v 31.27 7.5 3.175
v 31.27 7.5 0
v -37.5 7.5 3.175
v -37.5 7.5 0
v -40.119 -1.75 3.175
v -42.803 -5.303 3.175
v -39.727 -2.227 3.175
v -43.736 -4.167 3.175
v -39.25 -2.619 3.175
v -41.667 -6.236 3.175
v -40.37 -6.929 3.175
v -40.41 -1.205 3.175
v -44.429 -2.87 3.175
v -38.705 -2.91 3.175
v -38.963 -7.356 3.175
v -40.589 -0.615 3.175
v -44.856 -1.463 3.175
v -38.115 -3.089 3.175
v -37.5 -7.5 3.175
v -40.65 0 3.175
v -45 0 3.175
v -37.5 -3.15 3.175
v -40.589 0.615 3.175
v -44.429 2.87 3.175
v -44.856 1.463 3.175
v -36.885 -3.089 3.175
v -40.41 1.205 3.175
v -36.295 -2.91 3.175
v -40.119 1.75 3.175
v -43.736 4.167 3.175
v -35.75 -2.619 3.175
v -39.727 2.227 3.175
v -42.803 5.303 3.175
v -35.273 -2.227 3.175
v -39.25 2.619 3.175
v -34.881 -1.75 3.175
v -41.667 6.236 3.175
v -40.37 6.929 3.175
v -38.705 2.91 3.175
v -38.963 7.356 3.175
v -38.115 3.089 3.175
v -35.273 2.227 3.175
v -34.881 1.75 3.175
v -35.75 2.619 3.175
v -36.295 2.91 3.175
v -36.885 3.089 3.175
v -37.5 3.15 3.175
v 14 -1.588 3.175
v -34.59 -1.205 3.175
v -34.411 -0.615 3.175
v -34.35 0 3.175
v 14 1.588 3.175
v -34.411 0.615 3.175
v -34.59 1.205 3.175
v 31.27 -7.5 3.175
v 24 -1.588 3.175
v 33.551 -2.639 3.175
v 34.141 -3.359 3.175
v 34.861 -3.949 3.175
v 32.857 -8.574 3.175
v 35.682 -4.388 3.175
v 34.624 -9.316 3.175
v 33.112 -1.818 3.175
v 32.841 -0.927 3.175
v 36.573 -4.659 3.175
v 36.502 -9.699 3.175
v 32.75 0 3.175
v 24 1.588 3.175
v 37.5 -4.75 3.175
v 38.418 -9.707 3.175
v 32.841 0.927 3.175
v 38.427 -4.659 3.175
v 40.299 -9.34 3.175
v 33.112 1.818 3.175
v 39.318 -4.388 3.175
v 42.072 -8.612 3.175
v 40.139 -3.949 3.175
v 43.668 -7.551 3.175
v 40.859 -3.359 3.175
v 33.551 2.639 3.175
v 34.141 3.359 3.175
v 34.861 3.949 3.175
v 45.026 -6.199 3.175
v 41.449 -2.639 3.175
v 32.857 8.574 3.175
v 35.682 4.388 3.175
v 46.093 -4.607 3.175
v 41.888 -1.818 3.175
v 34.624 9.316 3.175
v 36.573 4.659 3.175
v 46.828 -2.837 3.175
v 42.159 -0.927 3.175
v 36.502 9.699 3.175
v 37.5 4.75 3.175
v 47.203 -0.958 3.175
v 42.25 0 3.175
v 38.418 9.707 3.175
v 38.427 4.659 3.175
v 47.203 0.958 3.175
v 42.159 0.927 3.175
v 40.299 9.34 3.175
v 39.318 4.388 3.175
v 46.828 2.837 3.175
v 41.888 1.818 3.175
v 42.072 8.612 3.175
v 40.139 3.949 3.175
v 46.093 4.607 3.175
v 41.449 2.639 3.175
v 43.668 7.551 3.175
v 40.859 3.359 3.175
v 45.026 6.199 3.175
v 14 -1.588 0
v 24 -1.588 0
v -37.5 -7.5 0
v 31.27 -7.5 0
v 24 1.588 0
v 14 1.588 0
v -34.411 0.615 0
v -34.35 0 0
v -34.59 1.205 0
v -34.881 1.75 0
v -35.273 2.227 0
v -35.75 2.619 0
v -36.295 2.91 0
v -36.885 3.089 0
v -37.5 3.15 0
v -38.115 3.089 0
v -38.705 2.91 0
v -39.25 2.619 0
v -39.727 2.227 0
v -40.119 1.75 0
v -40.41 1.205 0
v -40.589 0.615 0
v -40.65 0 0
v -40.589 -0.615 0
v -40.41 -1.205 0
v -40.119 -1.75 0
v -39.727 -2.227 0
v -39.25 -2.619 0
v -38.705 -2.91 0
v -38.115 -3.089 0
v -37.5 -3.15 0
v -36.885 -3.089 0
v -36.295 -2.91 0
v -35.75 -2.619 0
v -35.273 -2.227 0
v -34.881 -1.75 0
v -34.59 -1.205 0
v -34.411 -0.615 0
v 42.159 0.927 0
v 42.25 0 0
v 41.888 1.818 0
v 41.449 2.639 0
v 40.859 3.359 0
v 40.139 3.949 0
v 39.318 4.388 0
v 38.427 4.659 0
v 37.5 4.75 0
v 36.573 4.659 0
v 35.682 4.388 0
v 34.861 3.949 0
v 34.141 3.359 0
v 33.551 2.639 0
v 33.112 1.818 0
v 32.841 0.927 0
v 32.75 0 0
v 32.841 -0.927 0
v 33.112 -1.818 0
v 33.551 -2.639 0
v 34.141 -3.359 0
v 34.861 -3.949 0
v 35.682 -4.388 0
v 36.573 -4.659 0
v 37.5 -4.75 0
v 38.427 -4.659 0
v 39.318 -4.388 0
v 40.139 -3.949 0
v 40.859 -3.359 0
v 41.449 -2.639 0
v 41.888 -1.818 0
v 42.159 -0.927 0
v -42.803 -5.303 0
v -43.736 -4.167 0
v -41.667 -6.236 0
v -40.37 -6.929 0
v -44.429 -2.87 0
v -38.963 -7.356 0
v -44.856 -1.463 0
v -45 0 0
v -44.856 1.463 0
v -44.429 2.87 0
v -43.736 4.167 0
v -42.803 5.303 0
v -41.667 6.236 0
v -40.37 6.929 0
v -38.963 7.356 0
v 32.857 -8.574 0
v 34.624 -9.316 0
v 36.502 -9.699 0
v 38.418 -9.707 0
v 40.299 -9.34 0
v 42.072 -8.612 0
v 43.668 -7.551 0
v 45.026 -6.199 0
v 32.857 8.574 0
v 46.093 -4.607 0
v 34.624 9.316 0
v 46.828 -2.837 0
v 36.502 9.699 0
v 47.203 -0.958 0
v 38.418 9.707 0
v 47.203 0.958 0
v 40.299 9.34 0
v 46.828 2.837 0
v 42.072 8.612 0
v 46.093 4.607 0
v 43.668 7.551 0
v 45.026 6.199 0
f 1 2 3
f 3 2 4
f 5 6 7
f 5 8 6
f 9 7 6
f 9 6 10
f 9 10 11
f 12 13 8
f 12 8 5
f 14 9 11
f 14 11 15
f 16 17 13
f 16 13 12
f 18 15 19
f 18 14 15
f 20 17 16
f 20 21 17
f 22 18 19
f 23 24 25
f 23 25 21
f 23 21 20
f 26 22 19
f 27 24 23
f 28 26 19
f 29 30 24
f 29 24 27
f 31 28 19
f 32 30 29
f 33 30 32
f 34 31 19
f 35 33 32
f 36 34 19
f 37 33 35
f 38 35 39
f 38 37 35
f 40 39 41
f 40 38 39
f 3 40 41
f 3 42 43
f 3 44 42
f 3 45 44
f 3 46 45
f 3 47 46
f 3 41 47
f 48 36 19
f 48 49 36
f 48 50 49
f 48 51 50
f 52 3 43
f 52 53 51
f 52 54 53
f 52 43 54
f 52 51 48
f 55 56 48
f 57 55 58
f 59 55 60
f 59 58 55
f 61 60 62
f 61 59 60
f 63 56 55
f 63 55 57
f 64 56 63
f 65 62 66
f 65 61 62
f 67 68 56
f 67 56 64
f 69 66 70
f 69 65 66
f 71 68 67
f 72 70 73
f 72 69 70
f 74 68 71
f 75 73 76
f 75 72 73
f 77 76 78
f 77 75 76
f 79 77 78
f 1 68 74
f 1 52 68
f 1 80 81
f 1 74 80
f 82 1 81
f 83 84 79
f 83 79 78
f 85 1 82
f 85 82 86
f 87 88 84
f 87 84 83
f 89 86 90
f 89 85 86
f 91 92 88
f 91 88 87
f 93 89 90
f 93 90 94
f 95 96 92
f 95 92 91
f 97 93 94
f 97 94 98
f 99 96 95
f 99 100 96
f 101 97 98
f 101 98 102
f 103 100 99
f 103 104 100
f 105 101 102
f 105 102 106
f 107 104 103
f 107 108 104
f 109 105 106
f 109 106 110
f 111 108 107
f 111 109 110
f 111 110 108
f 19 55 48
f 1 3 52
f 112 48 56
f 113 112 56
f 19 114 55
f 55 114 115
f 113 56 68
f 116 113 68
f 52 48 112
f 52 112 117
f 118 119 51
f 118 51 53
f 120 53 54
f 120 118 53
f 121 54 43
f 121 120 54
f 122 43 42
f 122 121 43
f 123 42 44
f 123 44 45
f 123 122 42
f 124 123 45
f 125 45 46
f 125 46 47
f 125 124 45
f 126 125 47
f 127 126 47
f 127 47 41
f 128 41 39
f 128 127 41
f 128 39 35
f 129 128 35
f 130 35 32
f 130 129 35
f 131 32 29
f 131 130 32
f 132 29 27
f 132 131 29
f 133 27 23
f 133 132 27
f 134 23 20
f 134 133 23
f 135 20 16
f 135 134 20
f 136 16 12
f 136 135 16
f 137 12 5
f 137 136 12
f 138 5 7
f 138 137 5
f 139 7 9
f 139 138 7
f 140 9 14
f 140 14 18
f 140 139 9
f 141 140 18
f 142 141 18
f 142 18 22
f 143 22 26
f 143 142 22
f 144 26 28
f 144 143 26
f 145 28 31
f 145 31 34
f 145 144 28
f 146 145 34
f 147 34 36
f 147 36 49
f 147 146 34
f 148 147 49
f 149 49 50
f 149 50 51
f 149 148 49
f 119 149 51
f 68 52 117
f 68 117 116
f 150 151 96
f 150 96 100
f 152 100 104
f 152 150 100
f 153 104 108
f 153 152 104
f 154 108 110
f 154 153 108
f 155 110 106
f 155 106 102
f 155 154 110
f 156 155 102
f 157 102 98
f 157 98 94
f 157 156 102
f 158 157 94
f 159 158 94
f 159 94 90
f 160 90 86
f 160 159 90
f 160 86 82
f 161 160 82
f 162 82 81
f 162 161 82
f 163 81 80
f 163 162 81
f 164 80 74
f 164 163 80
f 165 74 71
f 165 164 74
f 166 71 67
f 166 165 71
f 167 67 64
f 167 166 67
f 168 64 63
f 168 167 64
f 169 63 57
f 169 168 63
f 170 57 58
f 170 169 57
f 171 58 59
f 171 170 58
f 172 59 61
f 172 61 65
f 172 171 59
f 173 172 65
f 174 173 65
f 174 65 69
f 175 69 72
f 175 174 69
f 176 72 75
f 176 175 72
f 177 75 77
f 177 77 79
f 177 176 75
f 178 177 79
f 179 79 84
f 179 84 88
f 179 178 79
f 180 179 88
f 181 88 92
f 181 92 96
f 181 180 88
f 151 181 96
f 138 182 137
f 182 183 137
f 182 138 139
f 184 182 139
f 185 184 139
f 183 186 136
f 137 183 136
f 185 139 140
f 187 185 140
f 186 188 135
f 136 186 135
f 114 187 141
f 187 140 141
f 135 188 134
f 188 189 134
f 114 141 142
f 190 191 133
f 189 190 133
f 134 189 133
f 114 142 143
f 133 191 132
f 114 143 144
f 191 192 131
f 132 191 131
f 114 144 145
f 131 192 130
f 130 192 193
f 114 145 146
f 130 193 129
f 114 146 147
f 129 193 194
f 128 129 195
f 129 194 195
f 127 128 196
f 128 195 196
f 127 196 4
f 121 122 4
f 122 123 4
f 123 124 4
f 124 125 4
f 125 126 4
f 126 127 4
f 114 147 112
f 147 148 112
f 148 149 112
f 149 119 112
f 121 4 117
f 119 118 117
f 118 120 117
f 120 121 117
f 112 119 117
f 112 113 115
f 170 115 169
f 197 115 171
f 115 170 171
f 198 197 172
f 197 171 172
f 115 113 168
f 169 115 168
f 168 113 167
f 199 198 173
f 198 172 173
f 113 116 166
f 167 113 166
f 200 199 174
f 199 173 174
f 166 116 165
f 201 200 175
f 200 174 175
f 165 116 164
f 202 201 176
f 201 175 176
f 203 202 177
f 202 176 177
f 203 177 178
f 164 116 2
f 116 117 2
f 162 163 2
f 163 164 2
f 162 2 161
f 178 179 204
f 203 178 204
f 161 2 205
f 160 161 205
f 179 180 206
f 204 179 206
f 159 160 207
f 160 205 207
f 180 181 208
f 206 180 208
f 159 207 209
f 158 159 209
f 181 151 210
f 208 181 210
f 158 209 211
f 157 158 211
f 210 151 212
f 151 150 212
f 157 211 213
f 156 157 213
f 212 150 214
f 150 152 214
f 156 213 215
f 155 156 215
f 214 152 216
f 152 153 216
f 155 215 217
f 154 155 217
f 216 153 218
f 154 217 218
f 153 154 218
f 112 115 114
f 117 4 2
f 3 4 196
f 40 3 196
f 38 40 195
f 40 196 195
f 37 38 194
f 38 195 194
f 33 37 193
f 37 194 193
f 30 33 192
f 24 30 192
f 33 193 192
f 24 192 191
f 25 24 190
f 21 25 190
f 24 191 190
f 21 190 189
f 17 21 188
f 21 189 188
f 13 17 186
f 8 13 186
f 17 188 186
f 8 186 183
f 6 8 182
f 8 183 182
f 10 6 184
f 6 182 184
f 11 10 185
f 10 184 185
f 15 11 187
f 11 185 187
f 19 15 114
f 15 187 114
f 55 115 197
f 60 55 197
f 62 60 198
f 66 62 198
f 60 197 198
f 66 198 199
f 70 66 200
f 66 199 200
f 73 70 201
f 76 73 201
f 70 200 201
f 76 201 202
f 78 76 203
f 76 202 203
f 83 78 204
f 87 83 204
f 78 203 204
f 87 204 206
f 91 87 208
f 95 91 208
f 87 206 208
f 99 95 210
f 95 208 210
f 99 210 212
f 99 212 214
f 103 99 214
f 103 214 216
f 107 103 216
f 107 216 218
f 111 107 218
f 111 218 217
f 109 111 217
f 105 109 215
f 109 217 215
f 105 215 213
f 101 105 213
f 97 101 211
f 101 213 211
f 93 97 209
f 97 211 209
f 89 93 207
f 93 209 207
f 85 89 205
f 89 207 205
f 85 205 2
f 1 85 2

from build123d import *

# Parameters (mm, degrees)
SKETCH1_R           = 3.15
SKETCH1_R_2         = 4.75
BOSS_EXTRUDE1_DEPTH = 3.175
SKETCH2_W           = 15
SKETCH2_H           = 3.175
SKETCH2_W_2         = 10
CUT_EXTRUDE1_DEPTH  = 49.349825491
SKETCH4_W           = 20.014244063
SKETCH4_H           = 7.260981568
BOSS_EXTRUDE2_DEPTH = 3.175


with BuildPart() as part:
    # Sketch1 → Boss-Extrude1 (new body)
    with BuildSketch(Plane.XY):
        with BuildLine():
            Line((-37.5, -7.5), (31.270032103, -7.5))
            ThreePointArc((31.270032103, -7.5), (47.25, 0), (31.270032103, 7.5))
            Line((31.270032103, 7.5), (-37.5, 7.5))
            ThreePointArc((-37.5, 7.5), (-45, 0), (-37.5, -7.5))
        make_face()
        with Locations((-37.5, 0)):
            Circle(SKETCH1_R, mode=Mode.SUBTRACT)
        with Locations((37.5, 0)):
            Circle(SKETCH1_R_2, mode=Mode.SUBTRACT)
    extrude(amount=BOSS_EXTRUDE1_DEPTH)

    # Sketch2 → Cut-Extrude1 (cut, through all)
    with BuildSketch(Plane.XY.offset(3.175)):
        with Locations((-17.5, 0)):
            Rectangle(SKETCH2_W, SKETCH2_H)
        with Locations((19, 0)):
            Rectangle(SKETCH2_W_2, SKETCH2_H)
    extrude(amount=-CUT_EXTRUDE1_DEPTH, mode=Mode.SUBTRACT)

    # Sketch4 → Boss-Extrude2 (add)
    with BuildSketch(Plane.XY.offset(3.175)):
        with Locations((-17.454282614, 0)):
            Rectangle(SKETCH4_W, SKETCH4_H)
    extrude(amount=-BOSS_EXTRUDE2_DEPTH)


solid = part.part
